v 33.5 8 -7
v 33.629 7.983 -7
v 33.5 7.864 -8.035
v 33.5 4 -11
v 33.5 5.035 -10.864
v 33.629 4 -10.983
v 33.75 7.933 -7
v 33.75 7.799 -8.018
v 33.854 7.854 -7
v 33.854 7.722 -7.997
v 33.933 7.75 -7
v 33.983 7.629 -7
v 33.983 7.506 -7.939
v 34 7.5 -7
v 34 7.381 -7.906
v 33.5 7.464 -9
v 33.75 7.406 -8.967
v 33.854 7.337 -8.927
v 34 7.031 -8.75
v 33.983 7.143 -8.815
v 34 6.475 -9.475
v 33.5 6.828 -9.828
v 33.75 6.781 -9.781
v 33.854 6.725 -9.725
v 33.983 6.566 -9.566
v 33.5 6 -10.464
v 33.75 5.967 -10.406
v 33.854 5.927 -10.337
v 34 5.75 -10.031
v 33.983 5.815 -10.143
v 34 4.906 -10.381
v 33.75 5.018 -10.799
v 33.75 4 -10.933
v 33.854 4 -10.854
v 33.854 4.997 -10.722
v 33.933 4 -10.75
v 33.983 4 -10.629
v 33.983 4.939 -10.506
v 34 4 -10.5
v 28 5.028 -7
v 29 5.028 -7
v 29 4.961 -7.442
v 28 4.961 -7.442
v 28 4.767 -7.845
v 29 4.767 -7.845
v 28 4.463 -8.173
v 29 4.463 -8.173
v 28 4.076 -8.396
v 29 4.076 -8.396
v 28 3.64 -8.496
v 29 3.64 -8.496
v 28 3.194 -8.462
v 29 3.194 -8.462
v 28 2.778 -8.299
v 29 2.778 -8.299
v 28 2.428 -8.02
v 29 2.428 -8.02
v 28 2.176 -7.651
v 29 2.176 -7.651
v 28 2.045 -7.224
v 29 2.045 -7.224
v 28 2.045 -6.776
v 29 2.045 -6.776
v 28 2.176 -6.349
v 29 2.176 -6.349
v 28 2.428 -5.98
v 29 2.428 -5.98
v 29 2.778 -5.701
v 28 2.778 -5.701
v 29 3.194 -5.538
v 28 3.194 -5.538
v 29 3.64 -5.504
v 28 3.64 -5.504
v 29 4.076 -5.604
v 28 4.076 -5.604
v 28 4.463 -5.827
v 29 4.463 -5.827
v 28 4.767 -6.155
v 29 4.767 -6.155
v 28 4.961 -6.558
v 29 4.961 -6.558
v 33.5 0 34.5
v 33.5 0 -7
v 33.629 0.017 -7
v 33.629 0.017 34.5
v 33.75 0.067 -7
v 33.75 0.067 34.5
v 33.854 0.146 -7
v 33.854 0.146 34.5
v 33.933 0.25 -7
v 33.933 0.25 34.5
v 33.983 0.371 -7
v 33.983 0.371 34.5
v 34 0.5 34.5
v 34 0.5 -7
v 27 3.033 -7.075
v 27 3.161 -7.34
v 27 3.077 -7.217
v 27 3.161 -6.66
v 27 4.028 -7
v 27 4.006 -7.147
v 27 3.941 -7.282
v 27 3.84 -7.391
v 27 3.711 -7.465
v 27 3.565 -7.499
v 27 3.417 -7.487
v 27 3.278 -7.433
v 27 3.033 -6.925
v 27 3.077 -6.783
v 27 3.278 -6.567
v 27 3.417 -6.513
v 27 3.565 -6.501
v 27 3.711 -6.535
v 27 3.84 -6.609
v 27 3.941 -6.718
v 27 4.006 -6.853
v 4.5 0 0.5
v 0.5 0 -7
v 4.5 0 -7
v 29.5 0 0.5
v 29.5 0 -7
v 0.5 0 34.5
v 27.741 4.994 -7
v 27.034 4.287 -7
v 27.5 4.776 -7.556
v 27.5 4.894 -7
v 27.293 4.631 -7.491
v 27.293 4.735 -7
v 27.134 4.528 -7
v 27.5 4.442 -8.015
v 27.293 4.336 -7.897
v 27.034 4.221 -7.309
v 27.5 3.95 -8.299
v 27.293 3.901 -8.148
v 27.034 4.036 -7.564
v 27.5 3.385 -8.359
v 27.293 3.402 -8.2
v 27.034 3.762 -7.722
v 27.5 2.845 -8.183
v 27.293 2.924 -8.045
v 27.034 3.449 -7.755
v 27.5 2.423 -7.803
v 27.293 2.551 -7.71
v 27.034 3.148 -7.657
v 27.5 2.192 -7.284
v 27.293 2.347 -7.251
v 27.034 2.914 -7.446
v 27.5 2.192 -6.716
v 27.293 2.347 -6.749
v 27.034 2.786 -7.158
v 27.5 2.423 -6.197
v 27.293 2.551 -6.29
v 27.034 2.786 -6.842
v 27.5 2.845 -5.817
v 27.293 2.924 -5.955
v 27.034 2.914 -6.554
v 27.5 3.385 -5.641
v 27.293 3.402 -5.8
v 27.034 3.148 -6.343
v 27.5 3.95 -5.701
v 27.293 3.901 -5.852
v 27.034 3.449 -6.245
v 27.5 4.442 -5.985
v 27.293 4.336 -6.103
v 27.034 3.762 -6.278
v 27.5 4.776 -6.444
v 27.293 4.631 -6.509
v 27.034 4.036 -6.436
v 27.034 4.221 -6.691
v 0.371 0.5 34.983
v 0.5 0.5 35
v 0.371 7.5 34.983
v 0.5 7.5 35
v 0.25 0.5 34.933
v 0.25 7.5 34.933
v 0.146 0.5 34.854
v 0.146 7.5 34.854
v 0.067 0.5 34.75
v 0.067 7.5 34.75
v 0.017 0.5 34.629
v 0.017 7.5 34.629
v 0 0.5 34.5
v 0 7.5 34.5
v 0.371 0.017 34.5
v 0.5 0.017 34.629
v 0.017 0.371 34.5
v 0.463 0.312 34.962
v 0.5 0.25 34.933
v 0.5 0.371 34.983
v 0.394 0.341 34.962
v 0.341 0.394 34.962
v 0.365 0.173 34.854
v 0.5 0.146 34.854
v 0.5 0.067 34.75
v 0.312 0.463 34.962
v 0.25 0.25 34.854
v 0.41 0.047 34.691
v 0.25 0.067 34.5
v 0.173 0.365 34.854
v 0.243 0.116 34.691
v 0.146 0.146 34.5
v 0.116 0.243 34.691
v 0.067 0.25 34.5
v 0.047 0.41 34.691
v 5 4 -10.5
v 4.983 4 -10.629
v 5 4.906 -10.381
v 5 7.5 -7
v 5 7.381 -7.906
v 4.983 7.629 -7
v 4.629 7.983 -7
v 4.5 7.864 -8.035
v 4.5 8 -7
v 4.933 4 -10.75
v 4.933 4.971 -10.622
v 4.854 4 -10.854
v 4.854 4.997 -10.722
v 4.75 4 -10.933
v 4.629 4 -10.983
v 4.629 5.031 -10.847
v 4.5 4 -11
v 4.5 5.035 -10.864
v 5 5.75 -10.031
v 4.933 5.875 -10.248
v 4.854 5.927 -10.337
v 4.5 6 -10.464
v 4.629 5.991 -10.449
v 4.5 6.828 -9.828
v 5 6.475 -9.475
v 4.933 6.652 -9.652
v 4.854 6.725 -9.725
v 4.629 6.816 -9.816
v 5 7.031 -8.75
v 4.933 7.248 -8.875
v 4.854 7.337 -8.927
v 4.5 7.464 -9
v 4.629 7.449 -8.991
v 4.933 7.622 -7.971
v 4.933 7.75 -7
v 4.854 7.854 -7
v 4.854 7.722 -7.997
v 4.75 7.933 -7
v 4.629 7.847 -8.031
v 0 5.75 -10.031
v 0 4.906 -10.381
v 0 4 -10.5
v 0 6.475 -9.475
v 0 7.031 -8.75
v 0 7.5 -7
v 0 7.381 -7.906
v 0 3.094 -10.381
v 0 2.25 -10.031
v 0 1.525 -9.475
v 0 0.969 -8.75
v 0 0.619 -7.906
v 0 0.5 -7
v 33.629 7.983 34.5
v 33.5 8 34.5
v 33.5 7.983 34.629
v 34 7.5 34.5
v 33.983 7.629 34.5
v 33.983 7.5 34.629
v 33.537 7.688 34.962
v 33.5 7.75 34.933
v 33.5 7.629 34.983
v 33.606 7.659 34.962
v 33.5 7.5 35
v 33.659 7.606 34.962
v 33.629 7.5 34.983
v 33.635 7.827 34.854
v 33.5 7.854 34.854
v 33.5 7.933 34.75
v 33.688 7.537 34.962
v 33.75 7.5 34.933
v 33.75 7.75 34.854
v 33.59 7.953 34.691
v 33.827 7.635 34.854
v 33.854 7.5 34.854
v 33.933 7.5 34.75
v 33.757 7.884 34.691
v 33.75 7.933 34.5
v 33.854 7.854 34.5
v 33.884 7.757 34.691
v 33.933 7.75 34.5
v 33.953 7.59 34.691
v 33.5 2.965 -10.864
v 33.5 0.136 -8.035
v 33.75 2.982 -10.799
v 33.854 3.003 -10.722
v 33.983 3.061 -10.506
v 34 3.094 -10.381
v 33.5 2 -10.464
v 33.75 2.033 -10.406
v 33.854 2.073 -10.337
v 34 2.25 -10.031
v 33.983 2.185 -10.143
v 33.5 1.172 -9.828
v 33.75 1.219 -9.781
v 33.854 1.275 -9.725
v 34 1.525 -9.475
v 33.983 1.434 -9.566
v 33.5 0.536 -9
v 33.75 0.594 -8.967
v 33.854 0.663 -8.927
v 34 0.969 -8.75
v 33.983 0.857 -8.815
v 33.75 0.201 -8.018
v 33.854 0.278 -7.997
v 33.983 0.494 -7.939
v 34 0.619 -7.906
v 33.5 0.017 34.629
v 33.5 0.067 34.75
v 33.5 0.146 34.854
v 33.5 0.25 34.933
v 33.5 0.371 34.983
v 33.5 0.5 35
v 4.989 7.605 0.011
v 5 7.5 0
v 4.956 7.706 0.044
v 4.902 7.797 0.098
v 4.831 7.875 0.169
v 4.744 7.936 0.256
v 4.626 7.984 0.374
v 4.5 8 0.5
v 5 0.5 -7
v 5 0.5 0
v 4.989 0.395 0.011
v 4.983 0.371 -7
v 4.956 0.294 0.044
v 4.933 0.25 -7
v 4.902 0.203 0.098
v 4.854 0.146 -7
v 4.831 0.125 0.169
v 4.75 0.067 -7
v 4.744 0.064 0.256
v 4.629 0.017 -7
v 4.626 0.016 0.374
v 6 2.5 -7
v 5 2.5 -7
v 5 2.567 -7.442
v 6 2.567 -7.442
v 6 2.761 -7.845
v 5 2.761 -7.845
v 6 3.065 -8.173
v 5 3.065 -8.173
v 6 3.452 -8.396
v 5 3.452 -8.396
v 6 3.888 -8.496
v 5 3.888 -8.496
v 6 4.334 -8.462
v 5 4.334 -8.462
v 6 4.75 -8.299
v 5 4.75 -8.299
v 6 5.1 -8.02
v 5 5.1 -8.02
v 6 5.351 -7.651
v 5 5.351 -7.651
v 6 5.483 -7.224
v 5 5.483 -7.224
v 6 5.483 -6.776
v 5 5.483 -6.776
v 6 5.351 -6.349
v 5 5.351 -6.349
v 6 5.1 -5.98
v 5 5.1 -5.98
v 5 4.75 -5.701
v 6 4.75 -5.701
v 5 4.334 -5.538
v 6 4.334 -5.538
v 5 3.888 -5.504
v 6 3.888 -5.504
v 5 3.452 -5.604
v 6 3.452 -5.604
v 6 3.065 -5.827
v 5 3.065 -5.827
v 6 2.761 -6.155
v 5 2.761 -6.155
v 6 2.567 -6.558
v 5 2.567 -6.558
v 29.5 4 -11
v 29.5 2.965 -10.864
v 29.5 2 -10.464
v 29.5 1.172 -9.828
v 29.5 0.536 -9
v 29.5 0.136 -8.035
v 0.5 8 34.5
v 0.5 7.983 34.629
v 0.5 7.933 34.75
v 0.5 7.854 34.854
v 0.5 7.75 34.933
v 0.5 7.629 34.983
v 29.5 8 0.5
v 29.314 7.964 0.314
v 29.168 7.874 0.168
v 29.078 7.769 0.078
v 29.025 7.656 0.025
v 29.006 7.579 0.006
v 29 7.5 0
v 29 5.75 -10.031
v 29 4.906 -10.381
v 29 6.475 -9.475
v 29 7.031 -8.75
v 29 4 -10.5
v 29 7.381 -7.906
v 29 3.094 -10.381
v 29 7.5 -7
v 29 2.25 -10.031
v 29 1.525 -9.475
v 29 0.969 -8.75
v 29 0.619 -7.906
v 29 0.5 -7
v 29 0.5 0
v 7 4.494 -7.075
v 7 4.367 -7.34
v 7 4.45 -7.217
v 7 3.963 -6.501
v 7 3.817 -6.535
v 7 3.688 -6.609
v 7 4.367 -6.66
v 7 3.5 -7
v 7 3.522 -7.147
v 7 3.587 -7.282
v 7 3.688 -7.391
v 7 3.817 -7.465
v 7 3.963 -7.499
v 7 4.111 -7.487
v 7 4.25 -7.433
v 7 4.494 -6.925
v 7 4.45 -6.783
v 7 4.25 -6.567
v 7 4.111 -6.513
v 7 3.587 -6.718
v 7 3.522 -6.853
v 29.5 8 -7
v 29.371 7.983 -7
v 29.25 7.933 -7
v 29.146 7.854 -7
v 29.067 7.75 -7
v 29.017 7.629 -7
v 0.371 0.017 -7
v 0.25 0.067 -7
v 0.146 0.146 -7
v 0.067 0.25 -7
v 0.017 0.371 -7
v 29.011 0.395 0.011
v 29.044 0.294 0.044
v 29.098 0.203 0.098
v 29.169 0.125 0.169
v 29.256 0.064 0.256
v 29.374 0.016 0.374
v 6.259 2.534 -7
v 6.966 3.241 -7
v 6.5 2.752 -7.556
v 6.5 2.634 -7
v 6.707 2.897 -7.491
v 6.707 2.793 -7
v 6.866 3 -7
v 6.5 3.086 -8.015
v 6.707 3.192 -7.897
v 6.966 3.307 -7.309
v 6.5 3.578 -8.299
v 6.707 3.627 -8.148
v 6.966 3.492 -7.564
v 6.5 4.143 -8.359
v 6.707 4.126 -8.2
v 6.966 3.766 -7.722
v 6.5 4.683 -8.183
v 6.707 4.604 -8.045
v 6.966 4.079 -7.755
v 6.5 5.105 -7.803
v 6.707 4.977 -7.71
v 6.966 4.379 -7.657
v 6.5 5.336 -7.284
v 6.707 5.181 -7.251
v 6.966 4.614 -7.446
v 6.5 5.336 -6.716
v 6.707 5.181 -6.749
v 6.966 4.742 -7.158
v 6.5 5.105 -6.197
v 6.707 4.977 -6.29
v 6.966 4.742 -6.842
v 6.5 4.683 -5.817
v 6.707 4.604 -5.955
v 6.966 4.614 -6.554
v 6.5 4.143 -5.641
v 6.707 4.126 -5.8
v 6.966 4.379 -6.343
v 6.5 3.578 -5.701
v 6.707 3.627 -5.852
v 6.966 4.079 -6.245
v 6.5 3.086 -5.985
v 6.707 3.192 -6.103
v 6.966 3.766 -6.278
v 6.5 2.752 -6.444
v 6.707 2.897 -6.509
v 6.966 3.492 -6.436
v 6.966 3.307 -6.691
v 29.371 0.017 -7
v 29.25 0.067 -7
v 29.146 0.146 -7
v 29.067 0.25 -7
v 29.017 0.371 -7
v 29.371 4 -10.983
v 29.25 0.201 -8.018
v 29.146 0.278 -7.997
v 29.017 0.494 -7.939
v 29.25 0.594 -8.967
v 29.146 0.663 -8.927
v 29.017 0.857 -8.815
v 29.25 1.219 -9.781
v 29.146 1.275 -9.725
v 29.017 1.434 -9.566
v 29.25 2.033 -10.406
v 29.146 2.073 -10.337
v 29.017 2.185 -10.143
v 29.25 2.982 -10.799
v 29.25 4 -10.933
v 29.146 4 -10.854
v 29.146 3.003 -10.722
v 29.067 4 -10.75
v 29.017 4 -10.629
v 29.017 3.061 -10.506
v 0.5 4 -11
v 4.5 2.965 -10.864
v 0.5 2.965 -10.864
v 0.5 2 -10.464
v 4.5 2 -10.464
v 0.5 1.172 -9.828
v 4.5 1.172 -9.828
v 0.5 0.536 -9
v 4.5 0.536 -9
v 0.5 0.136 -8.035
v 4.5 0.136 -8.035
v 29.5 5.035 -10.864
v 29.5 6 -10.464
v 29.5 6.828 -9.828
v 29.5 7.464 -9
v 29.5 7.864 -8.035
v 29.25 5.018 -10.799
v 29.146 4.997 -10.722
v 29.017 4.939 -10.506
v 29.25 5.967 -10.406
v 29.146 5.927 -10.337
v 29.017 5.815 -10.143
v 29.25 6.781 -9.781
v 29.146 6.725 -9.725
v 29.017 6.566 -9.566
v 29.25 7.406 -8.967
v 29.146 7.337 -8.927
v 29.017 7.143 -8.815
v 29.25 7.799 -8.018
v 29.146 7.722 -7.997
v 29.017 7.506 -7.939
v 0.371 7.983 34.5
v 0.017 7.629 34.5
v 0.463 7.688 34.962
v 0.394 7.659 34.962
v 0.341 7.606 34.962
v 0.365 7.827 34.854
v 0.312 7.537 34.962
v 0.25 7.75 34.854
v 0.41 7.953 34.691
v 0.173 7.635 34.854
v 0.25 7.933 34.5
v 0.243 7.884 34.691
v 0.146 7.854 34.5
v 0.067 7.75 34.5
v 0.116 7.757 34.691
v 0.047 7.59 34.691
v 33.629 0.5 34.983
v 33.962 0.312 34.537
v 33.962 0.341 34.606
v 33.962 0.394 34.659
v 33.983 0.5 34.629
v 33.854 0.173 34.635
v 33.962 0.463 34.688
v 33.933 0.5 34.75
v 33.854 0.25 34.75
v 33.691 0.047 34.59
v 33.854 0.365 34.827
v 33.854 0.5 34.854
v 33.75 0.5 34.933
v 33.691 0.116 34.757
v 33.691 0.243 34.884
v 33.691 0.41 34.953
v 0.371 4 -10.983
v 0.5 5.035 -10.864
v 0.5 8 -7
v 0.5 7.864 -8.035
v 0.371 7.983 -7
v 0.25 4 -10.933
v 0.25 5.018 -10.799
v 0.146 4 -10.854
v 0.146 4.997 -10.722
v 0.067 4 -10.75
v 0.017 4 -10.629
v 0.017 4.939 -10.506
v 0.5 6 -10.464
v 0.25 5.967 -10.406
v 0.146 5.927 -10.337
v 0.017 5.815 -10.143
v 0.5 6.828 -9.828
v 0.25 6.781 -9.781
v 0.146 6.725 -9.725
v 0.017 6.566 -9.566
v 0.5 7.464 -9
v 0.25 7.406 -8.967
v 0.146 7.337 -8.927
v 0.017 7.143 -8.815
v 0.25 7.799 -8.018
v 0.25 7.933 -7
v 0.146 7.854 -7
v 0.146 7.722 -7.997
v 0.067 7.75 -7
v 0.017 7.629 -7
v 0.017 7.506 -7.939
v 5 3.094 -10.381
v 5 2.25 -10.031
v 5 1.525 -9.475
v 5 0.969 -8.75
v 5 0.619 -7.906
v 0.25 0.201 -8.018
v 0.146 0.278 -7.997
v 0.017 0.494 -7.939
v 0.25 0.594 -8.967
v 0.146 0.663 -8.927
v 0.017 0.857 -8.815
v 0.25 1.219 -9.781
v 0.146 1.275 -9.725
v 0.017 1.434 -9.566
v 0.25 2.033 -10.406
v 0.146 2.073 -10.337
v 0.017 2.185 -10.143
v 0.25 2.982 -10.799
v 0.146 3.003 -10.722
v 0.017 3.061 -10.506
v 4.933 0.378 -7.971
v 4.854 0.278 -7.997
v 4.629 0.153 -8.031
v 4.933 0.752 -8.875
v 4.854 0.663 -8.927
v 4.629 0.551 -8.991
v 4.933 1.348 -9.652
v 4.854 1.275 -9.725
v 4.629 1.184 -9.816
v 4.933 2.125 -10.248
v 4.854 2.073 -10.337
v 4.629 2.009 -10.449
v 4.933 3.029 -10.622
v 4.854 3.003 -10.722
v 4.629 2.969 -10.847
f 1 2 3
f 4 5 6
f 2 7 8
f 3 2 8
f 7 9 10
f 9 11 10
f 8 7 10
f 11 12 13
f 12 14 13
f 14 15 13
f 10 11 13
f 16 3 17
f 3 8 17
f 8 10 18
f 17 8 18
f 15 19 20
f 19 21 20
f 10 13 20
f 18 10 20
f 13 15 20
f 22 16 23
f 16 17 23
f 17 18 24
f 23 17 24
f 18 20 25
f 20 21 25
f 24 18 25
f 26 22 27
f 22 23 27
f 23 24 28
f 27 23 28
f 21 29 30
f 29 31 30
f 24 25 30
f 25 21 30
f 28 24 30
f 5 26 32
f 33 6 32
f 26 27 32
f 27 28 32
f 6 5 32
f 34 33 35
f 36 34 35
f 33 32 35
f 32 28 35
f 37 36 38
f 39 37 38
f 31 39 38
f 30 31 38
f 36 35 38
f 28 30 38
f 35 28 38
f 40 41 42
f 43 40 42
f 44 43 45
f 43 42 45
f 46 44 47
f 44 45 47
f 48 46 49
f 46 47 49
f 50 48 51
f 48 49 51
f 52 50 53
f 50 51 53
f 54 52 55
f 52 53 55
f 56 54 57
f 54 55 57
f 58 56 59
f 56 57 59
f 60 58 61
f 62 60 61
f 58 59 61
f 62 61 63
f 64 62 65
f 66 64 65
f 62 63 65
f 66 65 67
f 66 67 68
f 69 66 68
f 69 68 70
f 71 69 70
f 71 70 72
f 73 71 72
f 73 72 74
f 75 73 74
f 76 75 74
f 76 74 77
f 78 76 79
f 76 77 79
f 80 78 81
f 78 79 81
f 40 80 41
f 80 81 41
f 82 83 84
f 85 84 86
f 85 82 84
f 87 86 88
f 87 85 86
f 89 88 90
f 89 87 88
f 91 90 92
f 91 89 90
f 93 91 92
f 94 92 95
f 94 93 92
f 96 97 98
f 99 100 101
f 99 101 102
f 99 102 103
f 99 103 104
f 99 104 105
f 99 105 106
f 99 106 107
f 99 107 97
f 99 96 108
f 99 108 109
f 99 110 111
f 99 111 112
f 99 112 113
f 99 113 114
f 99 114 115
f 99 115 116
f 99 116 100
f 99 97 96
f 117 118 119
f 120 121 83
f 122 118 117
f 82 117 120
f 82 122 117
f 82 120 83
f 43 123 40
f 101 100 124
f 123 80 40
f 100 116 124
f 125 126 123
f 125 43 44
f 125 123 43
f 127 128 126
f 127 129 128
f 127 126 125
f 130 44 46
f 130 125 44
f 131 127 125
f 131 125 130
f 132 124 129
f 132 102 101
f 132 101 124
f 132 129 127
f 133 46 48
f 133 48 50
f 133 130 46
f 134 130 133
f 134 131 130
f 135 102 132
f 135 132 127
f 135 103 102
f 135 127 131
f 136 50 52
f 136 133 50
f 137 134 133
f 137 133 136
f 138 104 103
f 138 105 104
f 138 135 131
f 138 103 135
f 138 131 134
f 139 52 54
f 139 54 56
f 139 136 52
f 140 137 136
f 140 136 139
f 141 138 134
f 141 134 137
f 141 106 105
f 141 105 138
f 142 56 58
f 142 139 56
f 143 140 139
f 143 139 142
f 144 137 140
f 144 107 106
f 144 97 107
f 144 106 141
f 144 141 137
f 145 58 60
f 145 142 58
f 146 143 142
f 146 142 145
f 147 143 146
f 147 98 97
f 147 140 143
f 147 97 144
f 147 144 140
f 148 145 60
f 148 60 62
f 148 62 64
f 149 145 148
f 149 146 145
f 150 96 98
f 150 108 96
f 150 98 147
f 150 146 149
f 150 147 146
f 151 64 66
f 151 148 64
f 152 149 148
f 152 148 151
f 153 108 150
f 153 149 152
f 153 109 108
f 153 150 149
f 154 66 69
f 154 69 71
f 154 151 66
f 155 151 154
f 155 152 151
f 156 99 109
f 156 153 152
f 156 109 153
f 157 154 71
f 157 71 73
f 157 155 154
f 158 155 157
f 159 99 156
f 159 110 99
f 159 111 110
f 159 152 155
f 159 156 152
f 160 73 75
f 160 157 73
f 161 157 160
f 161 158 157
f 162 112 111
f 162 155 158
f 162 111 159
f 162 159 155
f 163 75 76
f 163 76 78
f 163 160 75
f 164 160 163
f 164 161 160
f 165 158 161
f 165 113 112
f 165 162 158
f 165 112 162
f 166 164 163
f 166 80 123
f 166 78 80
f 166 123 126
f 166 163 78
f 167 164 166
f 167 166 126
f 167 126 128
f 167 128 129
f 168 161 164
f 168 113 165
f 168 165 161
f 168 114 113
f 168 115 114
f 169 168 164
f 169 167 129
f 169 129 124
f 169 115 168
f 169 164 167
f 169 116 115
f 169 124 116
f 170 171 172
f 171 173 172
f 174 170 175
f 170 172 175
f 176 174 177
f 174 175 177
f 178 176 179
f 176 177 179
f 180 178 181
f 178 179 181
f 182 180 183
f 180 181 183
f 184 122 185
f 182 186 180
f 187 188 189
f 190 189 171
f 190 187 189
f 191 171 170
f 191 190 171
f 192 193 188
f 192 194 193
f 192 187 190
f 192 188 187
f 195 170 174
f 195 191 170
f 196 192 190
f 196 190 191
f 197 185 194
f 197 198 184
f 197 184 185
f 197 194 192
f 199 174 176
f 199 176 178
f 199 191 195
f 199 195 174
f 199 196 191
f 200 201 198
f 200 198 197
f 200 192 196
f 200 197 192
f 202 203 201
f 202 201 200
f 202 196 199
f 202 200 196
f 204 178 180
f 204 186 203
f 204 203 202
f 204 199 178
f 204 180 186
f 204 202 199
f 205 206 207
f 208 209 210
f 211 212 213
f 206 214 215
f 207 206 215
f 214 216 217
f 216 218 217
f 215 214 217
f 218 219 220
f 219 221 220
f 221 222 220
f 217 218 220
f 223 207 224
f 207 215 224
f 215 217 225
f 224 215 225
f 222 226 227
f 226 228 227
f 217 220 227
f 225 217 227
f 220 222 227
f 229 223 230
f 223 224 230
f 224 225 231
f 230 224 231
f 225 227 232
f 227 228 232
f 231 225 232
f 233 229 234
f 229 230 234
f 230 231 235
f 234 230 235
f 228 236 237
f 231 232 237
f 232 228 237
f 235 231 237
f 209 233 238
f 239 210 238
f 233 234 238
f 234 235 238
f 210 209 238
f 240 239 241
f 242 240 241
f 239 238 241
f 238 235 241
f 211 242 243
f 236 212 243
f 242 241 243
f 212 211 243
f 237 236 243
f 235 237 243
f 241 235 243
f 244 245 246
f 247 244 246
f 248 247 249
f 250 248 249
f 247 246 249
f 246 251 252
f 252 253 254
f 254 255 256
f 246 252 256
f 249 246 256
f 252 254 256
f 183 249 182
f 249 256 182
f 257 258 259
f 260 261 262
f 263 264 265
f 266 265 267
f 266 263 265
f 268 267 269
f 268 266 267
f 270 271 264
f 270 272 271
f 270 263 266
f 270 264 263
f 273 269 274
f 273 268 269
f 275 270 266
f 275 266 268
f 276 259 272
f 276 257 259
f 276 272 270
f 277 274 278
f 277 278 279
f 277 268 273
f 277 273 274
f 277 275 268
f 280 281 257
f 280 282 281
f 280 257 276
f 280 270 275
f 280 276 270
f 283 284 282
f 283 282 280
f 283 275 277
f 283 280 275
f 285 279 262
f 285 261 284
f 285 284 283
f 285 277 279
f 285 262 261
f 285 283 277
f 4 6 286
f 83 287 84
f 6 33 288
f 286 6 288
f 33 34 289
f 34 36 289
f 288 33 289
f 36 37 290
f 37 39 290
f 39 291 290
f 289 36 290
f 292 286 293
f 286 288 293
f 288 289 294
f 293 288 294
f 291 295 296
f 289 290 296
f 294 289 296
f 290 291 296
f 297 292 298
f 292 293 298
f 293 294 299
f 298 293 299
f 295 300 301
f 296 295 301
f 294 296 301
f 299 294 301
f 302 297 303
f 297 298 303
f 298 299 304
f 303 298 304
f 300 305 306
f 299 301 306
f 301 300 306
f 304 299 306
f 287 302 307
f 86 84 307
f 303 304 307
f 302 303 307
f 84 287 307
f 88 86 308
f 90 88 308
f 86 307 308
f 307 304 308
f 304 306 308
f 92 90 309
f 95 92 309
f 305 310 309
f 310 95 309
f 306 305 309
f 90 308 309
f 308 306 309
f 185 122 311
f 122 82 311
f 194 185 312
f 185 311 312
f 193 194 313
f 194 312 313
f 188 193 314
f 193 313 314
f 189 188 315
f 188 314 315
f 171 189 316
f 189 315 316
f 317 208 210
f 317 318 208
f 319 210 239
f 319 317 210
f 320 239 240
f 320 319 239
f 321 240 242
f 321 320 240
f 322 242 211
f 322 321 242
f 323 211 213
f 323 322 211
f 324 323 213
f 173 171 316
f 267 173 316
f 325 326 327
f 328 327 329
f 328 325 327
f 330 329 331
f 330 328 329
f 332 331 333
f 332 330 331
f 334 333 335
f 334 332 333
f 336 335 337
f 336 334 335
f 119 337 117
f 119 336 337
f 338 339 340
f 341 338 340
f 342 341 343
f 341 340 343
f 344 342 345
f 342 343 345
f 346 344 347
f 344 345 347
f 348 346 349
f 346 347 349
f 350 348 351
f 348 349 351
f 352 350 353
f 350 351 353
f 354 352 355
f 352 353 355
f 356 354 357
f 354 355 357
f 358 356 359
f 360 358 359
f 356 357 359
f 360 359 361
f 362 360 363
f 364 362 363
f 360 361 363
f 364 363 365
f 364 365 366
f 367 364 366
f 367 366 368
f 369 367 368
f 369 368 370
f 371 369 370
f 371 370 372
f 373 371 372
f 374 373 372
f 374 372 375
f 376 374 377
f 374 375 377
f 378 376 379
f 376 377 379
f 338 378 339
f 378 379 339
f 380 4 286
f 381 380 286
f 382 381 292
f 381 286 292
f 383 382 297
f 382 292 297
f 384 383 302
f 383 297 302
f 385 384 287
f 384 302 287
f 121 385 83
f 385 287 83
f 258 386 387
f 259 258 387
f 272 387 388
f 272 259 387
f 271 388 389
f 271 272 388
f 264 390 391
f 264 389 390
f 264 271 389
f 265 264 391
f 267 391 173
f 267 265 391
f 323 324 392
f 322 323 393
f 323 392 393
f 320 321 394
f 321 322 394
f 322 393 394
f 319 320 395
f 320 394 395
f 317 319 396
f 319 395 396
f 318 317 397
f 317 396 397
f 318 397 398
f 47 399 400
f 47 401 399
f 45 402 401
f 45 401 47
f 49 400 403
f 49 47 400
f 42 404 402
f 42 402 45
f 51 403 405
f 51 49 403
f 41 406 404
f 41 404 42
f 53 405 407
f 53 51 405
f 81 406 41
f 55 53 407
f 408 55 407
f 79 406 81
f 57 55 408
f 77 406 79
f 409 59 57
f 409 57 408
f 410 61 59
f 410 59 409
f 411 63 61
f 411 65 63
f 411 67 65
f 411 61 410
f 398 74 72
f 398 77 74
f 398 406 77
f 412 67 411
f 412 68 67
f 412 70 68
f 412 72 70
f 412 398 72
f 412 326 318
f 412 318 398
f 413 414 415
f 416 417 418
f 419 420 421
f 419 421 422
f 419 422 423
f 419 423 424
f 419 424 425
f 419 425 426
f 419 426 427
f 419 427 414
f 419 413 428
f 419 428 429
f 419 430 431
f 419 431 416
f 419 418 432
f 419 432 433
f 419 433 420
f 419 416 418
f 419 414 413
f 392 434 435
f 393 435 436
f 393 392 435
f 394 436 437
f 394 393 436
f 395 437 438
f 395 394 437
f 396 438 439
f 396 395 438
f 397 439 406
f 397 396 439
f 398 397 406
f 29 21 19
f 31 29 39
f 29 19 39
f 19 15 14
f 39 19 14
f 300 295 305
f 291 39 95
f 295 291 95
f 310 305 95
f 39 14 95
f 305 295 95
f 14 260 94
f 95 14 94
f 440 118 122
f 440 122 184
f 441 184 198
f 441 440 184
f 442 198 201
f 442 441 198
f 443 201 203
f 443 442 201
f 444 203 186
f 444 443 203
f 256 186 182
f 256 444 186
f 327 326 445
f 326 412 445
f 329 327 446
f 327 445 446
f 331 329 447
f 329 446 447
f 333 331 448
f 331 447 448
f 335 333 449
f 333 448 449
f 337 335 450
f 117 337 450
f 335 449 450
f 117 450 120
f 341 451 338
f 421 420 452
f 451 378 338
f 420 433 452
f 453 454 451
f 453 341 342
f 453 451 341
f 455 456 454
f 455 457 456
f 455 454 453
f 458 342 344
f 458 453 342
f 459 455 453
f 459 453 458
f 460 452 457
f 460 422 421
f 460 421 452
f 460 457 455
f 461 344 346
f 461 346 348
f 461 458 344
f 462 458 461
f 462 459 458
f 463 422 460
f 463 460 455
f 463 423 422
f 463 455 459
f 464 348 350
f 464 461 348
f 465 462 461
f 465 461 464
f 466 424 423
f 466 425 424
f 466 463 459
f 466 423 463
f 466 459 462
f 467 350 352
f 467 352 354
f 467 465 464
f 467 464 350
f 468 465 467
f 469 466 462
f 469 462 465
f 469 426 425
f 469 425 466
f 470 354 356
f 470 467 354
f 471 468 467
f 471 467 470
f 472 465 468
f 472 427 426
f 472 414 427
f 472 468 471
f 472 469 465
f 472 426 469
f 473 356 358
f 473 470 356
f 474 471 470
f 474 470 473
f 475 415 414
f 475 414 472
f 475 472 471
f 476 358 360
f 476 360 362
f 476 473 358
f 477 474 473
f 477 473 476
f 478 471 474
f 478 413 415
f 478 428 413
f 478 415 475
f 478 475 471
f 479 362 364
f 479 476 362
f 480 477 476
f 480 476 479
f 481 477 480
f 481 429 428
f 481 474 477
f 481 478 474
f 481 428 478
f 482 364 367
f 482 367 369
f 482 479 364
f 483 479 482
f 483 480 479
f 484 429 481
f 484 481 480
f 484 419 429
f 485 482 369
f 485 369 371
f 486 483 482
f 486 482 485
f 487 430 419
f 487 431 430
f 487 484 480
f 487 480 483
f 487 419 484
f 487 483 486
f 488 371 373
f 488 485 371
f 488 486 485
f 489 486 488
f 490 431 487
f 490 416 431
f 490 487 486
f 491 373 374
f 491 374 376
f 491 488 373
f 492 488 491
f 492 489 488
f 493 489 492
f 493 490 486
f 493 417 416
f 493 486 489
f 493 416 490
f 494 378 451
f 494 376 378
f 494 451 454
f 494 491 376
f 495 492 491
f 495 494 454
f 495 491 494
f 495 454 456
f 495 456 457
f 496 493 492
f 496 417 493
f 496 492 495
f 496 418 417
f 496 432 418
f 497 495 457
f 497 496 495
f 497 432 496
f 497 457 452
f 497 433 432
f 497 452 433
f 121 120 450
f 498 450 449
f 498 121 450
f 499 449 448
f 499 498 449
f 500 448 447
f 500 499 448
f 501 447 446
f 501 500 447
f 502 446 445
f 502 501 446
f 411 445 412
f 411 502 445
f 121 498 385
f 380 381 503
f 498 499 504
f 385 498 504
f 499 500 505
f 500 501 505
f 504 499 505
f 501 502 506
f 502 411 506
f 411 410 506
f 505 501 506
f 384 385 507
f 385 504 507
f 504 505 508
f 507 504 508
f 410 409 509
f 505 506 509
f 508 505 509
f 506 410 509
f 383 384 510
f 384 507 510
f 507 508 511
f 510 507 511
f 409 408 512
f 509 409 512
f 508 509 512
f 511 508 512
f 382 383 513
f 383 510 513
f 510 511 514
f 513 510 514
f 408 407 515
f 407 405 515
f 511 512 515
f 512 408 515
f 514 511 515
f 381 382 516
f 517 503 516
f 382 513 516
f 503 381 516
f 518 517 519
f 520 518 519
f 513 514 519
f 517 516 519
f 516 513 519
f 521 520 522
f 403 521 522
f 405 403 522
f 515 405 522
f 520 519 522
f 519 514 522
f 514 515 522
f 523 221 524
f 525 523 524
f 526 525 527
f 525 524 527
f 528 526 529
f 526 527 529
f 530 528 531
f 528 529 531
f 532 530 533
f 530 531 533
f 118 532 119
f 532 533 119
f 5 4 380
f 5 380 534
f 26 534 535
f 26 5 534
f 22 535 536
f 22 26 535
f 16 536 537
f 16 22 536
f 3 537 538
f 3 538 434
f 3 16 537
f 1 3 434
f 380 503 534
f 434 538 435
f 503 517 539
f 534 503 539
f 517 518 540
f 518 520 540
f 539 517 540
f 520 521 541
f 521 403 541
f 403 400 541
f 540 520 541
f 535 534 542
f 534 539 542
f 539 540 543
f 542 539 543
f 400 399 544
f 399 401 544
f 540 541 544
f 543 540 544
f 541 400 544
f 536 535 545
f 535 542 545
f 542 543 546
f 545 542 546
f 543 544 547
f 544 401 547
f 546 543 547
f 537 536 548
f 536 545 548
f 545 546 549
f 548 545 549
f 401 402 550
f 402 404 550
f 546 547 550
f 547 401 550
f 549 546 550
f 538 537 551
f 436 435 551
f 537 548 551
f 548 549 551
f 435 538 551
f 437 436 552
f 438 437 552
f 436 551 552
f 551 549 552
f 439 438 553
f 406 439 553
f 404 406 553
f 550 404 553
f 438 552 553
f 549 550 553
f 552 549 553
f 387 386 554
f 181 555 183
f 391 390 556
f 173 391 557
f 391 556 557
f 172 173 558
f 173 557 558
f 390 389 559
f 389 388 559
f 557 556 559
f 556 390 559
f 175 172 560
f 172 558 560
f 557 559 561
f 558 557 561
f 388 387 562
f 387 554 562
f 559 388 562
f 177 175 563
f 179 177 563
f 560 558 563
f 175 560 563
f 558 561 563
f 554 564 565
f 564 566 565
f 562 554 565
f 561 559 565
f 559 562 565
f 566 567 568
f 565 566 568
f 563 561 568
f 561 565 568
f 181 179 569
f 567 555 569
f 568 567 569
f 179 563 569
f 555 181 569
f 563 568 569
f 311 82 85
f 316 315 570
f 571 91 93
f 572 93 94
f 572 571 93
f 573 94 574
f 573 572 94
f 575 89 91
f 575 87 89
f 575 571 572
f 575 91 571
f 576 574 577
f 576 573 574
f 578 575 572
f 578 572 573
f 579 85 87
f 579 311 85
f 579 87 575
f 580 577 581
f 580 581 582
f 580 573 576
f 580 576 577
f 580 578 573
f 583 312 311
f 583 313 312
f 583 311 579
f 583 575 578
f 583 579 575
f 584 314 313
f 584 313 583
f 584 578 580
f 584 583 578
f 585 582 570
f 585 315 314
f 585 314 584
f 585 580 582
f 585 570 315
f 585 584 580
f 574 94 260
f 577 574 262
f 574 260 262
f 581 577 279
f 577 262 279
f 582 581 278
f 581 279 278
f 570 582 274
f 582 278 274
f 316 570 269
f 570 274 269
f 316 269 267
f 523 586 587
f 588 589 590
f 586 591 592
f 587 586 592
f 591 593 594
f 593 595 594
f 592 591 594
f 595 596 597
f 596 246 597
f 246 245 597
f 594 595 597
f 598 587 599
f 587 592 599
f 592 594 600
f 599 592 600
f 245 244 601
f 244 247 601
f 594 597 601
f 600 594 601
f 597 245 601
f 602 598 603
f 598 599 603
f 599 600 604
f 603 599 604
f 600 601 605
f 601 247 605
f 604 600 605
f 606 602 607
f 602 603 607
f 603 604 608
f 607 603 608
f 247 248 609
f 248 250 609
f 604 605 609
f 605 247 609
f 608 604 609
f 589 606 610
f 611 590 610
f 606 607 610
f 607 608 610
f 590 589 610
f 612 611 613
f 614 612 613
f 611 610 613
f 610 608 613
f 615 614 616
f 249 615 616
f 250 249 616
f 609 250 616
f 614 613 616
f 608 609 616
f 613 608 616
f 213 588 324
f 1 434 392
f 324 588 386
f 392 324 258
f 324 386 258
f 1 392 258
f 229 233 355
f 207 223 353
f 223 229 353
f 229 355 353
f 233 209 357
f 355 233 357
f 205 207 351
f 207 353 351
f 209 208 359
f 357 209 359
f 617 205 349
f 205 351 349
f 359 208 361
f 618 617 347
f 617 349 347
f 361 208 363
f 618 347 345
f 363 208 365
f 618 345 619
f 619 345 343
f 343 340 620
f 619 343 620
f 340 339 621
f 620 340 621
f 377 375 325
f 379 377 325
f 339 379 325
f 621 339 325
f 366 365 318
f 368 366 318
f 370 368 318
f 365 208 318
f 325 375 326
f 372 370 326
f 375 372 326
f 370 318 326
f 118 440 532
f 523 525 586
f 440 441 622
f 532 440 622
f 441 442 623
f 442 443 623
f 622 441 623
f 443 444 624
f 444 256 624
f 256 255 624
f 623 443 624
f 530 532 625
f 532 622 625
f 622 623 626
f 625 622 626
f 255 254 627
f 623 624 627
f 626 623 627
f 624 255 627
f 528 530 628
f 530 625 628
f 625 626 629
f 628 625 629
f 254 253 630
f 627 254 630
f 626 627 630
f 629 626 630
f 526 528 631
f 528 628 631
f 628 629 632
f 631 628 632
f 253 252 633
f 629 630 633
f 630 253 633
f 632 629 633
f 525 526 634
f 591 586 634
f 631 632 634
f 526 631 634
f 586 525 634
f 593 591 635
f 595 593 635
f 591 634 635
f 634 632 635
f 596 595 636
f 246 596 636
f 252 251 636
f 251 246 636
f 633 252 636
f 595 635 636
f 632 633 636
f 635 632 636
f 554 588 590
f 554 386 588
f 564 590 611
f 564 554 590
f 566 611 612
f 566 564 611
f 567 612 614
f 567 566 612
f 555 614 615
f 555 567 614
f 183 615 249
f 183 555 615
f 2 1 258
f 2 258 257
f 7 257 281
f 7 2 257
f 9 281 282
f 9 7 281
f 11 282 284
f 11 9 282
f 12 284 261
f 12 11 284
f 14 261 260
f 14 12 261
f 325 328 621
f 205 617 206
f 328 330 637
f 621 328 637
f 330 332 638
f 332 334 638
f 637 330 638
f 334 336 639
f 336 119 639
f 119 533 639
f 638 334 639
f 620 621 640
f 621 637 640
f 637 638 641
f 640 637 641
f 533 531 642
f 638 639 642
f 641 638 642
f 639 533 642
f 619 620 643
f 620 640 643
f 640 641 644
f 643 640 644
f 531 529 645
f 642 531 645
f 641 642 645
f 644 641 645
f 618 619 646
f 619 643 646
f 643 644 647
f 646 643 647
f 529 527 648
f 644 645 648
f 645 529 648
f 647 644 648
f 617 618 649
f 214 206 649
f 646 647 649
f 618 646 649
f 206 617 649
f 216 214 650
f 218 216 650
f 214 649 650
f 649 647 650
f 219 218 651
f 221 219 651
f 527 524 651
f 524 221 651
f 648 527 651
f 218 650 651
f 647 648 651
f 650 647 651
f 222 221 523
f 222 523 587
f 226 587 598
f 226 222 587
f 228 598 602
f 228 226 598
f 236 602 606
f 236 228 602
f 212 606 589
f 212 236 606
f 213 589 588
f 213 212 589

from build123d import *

# Parameters (mm, degrees)
F0_W     = 34
F0_H     = 35
F1_DEPTH = 8
F2_W     = 5
F2_H     = 8
F3_DEPTH = 11
F4_R     = 3.99999
F6_DEPTH = 2
F7_R     = 1
F9_DEPTH = 2
F10_R    = 1
F11_R    = 0.5


# Not quite as in the source:
# - a fillet or chamfer is up to 0.001 mm smaller than in the source, because OpenCascade refuses the exact size


with BuildPart() as f1:
    # F0 (on Front) → F1 (new body)
    with BuildSketch(Plane.XZ):
        with Locations((17, 17.5)):
            Rectangle(F0_W, F0_H)
    extrude(amount=-F1_DEPTH)

    # F2 (on face) → F3 (join)
    with BuildSketch(Plane(origin=(0, 0, 0), x_dir=(1, 0, 0), z_dir=(0, 0, -1))):
        with Locations((31.5, -4)):
            Rectangle(F2_W, F2_H)
        with Locations((2.5, -4)):
            Rectangle(F2_W, F2_H)
    extrude(amount=F3_DEPTH)

    # F4 (radius 4 in the source; OpenCascade refuses exactly that, so slightly less here)
    f4_edges = [f1.edges().sort_by_distance(p)[0] for p in [
        (2.5, 0, -11),
        (2.5, 8, -11),
        (31.5, 8, -11),
        (31.5, 0, -11),
    ]]
    fillet(f4_edges, radius=F4_R)

    # F5 (on face) → F6 (join)
    with BuildSketch(Plane(origin=(29, 0, 0), x_dir=(0, -1, 0), z_dir=(-1, 0, 0))):
        with BuildLine():
            Line((-5.027864045, -7), (-2.027864045, -7))
            ThreePointArc((-2.027864045, -7), (-3.527864045, -5.5), (-5.027864045, -7))
        make_face()
        with BuildLine():
            ThreePointArc((-5.027864045, -7), (-3.527864045, -8.5), (-2.027864045, -7))
            Line((-2.027864045, -7), (-5.027864045, -7))
        make_face()
    extrude(amount=F6_DEPTH)

    # F7
    f7_edges = [f1.edges().sort_by_distance(p)[0] for p in [
        (27, 2.027864, -7),
    ]]
    fillet(f7_edges, radius=F7_R)

    # F8 (on face) → F9 (join)
    with BuildSketch(Plane.YZ.offset(5)):
        with BuildLine():
            Line((2.5, -7), (5.5, -7))
            ThreePointArc((5.5, -7), (4, -5.5), (2.5, -7))
        make_face()
        with BuildLine():
            ThreePointArc((2.5, -7), (4, -8.5), (5.5, -7))
            Line((5.5, -7), (2.5, -7))
        make_face()
    extrude(amount=F9_DEPTH)

    # F10
    f10_edges = [f1.edges().sort_by_distance(p)[0] for p in [
        (7, 5.5, -7),
    ]]
    fillet(f10_edges, radius=F10_R)

    # F11
    f11_edges = [f1.edges().sort_by_distance(p)[0] for p in [
        (0, 0, 13.999995),
        (2.5, 0, -7.00001),
        (17, 0, 35),
        (5, 0, -3.500005),
        (34, 0, 13.999995),
        (17, 0, 0),
        (31.5, 0, -7.00001),
        (29, 0, -3.500005),
        (0, 8, 13.999995),
        (2.5, 8, -7.00001),
        (17, 8, 35),
        (5, 8, -3.500005),
        (34, 8, 13.999995),
        (17, 8, 0),
        (31.5, 8, -7.00001),
        (29, 8, -3.500005),
        (34, 4, 35),
        (0, 4, 35),
    ]]
    fillet(f11_edges, radius=F11_R)


solid = f1.part
